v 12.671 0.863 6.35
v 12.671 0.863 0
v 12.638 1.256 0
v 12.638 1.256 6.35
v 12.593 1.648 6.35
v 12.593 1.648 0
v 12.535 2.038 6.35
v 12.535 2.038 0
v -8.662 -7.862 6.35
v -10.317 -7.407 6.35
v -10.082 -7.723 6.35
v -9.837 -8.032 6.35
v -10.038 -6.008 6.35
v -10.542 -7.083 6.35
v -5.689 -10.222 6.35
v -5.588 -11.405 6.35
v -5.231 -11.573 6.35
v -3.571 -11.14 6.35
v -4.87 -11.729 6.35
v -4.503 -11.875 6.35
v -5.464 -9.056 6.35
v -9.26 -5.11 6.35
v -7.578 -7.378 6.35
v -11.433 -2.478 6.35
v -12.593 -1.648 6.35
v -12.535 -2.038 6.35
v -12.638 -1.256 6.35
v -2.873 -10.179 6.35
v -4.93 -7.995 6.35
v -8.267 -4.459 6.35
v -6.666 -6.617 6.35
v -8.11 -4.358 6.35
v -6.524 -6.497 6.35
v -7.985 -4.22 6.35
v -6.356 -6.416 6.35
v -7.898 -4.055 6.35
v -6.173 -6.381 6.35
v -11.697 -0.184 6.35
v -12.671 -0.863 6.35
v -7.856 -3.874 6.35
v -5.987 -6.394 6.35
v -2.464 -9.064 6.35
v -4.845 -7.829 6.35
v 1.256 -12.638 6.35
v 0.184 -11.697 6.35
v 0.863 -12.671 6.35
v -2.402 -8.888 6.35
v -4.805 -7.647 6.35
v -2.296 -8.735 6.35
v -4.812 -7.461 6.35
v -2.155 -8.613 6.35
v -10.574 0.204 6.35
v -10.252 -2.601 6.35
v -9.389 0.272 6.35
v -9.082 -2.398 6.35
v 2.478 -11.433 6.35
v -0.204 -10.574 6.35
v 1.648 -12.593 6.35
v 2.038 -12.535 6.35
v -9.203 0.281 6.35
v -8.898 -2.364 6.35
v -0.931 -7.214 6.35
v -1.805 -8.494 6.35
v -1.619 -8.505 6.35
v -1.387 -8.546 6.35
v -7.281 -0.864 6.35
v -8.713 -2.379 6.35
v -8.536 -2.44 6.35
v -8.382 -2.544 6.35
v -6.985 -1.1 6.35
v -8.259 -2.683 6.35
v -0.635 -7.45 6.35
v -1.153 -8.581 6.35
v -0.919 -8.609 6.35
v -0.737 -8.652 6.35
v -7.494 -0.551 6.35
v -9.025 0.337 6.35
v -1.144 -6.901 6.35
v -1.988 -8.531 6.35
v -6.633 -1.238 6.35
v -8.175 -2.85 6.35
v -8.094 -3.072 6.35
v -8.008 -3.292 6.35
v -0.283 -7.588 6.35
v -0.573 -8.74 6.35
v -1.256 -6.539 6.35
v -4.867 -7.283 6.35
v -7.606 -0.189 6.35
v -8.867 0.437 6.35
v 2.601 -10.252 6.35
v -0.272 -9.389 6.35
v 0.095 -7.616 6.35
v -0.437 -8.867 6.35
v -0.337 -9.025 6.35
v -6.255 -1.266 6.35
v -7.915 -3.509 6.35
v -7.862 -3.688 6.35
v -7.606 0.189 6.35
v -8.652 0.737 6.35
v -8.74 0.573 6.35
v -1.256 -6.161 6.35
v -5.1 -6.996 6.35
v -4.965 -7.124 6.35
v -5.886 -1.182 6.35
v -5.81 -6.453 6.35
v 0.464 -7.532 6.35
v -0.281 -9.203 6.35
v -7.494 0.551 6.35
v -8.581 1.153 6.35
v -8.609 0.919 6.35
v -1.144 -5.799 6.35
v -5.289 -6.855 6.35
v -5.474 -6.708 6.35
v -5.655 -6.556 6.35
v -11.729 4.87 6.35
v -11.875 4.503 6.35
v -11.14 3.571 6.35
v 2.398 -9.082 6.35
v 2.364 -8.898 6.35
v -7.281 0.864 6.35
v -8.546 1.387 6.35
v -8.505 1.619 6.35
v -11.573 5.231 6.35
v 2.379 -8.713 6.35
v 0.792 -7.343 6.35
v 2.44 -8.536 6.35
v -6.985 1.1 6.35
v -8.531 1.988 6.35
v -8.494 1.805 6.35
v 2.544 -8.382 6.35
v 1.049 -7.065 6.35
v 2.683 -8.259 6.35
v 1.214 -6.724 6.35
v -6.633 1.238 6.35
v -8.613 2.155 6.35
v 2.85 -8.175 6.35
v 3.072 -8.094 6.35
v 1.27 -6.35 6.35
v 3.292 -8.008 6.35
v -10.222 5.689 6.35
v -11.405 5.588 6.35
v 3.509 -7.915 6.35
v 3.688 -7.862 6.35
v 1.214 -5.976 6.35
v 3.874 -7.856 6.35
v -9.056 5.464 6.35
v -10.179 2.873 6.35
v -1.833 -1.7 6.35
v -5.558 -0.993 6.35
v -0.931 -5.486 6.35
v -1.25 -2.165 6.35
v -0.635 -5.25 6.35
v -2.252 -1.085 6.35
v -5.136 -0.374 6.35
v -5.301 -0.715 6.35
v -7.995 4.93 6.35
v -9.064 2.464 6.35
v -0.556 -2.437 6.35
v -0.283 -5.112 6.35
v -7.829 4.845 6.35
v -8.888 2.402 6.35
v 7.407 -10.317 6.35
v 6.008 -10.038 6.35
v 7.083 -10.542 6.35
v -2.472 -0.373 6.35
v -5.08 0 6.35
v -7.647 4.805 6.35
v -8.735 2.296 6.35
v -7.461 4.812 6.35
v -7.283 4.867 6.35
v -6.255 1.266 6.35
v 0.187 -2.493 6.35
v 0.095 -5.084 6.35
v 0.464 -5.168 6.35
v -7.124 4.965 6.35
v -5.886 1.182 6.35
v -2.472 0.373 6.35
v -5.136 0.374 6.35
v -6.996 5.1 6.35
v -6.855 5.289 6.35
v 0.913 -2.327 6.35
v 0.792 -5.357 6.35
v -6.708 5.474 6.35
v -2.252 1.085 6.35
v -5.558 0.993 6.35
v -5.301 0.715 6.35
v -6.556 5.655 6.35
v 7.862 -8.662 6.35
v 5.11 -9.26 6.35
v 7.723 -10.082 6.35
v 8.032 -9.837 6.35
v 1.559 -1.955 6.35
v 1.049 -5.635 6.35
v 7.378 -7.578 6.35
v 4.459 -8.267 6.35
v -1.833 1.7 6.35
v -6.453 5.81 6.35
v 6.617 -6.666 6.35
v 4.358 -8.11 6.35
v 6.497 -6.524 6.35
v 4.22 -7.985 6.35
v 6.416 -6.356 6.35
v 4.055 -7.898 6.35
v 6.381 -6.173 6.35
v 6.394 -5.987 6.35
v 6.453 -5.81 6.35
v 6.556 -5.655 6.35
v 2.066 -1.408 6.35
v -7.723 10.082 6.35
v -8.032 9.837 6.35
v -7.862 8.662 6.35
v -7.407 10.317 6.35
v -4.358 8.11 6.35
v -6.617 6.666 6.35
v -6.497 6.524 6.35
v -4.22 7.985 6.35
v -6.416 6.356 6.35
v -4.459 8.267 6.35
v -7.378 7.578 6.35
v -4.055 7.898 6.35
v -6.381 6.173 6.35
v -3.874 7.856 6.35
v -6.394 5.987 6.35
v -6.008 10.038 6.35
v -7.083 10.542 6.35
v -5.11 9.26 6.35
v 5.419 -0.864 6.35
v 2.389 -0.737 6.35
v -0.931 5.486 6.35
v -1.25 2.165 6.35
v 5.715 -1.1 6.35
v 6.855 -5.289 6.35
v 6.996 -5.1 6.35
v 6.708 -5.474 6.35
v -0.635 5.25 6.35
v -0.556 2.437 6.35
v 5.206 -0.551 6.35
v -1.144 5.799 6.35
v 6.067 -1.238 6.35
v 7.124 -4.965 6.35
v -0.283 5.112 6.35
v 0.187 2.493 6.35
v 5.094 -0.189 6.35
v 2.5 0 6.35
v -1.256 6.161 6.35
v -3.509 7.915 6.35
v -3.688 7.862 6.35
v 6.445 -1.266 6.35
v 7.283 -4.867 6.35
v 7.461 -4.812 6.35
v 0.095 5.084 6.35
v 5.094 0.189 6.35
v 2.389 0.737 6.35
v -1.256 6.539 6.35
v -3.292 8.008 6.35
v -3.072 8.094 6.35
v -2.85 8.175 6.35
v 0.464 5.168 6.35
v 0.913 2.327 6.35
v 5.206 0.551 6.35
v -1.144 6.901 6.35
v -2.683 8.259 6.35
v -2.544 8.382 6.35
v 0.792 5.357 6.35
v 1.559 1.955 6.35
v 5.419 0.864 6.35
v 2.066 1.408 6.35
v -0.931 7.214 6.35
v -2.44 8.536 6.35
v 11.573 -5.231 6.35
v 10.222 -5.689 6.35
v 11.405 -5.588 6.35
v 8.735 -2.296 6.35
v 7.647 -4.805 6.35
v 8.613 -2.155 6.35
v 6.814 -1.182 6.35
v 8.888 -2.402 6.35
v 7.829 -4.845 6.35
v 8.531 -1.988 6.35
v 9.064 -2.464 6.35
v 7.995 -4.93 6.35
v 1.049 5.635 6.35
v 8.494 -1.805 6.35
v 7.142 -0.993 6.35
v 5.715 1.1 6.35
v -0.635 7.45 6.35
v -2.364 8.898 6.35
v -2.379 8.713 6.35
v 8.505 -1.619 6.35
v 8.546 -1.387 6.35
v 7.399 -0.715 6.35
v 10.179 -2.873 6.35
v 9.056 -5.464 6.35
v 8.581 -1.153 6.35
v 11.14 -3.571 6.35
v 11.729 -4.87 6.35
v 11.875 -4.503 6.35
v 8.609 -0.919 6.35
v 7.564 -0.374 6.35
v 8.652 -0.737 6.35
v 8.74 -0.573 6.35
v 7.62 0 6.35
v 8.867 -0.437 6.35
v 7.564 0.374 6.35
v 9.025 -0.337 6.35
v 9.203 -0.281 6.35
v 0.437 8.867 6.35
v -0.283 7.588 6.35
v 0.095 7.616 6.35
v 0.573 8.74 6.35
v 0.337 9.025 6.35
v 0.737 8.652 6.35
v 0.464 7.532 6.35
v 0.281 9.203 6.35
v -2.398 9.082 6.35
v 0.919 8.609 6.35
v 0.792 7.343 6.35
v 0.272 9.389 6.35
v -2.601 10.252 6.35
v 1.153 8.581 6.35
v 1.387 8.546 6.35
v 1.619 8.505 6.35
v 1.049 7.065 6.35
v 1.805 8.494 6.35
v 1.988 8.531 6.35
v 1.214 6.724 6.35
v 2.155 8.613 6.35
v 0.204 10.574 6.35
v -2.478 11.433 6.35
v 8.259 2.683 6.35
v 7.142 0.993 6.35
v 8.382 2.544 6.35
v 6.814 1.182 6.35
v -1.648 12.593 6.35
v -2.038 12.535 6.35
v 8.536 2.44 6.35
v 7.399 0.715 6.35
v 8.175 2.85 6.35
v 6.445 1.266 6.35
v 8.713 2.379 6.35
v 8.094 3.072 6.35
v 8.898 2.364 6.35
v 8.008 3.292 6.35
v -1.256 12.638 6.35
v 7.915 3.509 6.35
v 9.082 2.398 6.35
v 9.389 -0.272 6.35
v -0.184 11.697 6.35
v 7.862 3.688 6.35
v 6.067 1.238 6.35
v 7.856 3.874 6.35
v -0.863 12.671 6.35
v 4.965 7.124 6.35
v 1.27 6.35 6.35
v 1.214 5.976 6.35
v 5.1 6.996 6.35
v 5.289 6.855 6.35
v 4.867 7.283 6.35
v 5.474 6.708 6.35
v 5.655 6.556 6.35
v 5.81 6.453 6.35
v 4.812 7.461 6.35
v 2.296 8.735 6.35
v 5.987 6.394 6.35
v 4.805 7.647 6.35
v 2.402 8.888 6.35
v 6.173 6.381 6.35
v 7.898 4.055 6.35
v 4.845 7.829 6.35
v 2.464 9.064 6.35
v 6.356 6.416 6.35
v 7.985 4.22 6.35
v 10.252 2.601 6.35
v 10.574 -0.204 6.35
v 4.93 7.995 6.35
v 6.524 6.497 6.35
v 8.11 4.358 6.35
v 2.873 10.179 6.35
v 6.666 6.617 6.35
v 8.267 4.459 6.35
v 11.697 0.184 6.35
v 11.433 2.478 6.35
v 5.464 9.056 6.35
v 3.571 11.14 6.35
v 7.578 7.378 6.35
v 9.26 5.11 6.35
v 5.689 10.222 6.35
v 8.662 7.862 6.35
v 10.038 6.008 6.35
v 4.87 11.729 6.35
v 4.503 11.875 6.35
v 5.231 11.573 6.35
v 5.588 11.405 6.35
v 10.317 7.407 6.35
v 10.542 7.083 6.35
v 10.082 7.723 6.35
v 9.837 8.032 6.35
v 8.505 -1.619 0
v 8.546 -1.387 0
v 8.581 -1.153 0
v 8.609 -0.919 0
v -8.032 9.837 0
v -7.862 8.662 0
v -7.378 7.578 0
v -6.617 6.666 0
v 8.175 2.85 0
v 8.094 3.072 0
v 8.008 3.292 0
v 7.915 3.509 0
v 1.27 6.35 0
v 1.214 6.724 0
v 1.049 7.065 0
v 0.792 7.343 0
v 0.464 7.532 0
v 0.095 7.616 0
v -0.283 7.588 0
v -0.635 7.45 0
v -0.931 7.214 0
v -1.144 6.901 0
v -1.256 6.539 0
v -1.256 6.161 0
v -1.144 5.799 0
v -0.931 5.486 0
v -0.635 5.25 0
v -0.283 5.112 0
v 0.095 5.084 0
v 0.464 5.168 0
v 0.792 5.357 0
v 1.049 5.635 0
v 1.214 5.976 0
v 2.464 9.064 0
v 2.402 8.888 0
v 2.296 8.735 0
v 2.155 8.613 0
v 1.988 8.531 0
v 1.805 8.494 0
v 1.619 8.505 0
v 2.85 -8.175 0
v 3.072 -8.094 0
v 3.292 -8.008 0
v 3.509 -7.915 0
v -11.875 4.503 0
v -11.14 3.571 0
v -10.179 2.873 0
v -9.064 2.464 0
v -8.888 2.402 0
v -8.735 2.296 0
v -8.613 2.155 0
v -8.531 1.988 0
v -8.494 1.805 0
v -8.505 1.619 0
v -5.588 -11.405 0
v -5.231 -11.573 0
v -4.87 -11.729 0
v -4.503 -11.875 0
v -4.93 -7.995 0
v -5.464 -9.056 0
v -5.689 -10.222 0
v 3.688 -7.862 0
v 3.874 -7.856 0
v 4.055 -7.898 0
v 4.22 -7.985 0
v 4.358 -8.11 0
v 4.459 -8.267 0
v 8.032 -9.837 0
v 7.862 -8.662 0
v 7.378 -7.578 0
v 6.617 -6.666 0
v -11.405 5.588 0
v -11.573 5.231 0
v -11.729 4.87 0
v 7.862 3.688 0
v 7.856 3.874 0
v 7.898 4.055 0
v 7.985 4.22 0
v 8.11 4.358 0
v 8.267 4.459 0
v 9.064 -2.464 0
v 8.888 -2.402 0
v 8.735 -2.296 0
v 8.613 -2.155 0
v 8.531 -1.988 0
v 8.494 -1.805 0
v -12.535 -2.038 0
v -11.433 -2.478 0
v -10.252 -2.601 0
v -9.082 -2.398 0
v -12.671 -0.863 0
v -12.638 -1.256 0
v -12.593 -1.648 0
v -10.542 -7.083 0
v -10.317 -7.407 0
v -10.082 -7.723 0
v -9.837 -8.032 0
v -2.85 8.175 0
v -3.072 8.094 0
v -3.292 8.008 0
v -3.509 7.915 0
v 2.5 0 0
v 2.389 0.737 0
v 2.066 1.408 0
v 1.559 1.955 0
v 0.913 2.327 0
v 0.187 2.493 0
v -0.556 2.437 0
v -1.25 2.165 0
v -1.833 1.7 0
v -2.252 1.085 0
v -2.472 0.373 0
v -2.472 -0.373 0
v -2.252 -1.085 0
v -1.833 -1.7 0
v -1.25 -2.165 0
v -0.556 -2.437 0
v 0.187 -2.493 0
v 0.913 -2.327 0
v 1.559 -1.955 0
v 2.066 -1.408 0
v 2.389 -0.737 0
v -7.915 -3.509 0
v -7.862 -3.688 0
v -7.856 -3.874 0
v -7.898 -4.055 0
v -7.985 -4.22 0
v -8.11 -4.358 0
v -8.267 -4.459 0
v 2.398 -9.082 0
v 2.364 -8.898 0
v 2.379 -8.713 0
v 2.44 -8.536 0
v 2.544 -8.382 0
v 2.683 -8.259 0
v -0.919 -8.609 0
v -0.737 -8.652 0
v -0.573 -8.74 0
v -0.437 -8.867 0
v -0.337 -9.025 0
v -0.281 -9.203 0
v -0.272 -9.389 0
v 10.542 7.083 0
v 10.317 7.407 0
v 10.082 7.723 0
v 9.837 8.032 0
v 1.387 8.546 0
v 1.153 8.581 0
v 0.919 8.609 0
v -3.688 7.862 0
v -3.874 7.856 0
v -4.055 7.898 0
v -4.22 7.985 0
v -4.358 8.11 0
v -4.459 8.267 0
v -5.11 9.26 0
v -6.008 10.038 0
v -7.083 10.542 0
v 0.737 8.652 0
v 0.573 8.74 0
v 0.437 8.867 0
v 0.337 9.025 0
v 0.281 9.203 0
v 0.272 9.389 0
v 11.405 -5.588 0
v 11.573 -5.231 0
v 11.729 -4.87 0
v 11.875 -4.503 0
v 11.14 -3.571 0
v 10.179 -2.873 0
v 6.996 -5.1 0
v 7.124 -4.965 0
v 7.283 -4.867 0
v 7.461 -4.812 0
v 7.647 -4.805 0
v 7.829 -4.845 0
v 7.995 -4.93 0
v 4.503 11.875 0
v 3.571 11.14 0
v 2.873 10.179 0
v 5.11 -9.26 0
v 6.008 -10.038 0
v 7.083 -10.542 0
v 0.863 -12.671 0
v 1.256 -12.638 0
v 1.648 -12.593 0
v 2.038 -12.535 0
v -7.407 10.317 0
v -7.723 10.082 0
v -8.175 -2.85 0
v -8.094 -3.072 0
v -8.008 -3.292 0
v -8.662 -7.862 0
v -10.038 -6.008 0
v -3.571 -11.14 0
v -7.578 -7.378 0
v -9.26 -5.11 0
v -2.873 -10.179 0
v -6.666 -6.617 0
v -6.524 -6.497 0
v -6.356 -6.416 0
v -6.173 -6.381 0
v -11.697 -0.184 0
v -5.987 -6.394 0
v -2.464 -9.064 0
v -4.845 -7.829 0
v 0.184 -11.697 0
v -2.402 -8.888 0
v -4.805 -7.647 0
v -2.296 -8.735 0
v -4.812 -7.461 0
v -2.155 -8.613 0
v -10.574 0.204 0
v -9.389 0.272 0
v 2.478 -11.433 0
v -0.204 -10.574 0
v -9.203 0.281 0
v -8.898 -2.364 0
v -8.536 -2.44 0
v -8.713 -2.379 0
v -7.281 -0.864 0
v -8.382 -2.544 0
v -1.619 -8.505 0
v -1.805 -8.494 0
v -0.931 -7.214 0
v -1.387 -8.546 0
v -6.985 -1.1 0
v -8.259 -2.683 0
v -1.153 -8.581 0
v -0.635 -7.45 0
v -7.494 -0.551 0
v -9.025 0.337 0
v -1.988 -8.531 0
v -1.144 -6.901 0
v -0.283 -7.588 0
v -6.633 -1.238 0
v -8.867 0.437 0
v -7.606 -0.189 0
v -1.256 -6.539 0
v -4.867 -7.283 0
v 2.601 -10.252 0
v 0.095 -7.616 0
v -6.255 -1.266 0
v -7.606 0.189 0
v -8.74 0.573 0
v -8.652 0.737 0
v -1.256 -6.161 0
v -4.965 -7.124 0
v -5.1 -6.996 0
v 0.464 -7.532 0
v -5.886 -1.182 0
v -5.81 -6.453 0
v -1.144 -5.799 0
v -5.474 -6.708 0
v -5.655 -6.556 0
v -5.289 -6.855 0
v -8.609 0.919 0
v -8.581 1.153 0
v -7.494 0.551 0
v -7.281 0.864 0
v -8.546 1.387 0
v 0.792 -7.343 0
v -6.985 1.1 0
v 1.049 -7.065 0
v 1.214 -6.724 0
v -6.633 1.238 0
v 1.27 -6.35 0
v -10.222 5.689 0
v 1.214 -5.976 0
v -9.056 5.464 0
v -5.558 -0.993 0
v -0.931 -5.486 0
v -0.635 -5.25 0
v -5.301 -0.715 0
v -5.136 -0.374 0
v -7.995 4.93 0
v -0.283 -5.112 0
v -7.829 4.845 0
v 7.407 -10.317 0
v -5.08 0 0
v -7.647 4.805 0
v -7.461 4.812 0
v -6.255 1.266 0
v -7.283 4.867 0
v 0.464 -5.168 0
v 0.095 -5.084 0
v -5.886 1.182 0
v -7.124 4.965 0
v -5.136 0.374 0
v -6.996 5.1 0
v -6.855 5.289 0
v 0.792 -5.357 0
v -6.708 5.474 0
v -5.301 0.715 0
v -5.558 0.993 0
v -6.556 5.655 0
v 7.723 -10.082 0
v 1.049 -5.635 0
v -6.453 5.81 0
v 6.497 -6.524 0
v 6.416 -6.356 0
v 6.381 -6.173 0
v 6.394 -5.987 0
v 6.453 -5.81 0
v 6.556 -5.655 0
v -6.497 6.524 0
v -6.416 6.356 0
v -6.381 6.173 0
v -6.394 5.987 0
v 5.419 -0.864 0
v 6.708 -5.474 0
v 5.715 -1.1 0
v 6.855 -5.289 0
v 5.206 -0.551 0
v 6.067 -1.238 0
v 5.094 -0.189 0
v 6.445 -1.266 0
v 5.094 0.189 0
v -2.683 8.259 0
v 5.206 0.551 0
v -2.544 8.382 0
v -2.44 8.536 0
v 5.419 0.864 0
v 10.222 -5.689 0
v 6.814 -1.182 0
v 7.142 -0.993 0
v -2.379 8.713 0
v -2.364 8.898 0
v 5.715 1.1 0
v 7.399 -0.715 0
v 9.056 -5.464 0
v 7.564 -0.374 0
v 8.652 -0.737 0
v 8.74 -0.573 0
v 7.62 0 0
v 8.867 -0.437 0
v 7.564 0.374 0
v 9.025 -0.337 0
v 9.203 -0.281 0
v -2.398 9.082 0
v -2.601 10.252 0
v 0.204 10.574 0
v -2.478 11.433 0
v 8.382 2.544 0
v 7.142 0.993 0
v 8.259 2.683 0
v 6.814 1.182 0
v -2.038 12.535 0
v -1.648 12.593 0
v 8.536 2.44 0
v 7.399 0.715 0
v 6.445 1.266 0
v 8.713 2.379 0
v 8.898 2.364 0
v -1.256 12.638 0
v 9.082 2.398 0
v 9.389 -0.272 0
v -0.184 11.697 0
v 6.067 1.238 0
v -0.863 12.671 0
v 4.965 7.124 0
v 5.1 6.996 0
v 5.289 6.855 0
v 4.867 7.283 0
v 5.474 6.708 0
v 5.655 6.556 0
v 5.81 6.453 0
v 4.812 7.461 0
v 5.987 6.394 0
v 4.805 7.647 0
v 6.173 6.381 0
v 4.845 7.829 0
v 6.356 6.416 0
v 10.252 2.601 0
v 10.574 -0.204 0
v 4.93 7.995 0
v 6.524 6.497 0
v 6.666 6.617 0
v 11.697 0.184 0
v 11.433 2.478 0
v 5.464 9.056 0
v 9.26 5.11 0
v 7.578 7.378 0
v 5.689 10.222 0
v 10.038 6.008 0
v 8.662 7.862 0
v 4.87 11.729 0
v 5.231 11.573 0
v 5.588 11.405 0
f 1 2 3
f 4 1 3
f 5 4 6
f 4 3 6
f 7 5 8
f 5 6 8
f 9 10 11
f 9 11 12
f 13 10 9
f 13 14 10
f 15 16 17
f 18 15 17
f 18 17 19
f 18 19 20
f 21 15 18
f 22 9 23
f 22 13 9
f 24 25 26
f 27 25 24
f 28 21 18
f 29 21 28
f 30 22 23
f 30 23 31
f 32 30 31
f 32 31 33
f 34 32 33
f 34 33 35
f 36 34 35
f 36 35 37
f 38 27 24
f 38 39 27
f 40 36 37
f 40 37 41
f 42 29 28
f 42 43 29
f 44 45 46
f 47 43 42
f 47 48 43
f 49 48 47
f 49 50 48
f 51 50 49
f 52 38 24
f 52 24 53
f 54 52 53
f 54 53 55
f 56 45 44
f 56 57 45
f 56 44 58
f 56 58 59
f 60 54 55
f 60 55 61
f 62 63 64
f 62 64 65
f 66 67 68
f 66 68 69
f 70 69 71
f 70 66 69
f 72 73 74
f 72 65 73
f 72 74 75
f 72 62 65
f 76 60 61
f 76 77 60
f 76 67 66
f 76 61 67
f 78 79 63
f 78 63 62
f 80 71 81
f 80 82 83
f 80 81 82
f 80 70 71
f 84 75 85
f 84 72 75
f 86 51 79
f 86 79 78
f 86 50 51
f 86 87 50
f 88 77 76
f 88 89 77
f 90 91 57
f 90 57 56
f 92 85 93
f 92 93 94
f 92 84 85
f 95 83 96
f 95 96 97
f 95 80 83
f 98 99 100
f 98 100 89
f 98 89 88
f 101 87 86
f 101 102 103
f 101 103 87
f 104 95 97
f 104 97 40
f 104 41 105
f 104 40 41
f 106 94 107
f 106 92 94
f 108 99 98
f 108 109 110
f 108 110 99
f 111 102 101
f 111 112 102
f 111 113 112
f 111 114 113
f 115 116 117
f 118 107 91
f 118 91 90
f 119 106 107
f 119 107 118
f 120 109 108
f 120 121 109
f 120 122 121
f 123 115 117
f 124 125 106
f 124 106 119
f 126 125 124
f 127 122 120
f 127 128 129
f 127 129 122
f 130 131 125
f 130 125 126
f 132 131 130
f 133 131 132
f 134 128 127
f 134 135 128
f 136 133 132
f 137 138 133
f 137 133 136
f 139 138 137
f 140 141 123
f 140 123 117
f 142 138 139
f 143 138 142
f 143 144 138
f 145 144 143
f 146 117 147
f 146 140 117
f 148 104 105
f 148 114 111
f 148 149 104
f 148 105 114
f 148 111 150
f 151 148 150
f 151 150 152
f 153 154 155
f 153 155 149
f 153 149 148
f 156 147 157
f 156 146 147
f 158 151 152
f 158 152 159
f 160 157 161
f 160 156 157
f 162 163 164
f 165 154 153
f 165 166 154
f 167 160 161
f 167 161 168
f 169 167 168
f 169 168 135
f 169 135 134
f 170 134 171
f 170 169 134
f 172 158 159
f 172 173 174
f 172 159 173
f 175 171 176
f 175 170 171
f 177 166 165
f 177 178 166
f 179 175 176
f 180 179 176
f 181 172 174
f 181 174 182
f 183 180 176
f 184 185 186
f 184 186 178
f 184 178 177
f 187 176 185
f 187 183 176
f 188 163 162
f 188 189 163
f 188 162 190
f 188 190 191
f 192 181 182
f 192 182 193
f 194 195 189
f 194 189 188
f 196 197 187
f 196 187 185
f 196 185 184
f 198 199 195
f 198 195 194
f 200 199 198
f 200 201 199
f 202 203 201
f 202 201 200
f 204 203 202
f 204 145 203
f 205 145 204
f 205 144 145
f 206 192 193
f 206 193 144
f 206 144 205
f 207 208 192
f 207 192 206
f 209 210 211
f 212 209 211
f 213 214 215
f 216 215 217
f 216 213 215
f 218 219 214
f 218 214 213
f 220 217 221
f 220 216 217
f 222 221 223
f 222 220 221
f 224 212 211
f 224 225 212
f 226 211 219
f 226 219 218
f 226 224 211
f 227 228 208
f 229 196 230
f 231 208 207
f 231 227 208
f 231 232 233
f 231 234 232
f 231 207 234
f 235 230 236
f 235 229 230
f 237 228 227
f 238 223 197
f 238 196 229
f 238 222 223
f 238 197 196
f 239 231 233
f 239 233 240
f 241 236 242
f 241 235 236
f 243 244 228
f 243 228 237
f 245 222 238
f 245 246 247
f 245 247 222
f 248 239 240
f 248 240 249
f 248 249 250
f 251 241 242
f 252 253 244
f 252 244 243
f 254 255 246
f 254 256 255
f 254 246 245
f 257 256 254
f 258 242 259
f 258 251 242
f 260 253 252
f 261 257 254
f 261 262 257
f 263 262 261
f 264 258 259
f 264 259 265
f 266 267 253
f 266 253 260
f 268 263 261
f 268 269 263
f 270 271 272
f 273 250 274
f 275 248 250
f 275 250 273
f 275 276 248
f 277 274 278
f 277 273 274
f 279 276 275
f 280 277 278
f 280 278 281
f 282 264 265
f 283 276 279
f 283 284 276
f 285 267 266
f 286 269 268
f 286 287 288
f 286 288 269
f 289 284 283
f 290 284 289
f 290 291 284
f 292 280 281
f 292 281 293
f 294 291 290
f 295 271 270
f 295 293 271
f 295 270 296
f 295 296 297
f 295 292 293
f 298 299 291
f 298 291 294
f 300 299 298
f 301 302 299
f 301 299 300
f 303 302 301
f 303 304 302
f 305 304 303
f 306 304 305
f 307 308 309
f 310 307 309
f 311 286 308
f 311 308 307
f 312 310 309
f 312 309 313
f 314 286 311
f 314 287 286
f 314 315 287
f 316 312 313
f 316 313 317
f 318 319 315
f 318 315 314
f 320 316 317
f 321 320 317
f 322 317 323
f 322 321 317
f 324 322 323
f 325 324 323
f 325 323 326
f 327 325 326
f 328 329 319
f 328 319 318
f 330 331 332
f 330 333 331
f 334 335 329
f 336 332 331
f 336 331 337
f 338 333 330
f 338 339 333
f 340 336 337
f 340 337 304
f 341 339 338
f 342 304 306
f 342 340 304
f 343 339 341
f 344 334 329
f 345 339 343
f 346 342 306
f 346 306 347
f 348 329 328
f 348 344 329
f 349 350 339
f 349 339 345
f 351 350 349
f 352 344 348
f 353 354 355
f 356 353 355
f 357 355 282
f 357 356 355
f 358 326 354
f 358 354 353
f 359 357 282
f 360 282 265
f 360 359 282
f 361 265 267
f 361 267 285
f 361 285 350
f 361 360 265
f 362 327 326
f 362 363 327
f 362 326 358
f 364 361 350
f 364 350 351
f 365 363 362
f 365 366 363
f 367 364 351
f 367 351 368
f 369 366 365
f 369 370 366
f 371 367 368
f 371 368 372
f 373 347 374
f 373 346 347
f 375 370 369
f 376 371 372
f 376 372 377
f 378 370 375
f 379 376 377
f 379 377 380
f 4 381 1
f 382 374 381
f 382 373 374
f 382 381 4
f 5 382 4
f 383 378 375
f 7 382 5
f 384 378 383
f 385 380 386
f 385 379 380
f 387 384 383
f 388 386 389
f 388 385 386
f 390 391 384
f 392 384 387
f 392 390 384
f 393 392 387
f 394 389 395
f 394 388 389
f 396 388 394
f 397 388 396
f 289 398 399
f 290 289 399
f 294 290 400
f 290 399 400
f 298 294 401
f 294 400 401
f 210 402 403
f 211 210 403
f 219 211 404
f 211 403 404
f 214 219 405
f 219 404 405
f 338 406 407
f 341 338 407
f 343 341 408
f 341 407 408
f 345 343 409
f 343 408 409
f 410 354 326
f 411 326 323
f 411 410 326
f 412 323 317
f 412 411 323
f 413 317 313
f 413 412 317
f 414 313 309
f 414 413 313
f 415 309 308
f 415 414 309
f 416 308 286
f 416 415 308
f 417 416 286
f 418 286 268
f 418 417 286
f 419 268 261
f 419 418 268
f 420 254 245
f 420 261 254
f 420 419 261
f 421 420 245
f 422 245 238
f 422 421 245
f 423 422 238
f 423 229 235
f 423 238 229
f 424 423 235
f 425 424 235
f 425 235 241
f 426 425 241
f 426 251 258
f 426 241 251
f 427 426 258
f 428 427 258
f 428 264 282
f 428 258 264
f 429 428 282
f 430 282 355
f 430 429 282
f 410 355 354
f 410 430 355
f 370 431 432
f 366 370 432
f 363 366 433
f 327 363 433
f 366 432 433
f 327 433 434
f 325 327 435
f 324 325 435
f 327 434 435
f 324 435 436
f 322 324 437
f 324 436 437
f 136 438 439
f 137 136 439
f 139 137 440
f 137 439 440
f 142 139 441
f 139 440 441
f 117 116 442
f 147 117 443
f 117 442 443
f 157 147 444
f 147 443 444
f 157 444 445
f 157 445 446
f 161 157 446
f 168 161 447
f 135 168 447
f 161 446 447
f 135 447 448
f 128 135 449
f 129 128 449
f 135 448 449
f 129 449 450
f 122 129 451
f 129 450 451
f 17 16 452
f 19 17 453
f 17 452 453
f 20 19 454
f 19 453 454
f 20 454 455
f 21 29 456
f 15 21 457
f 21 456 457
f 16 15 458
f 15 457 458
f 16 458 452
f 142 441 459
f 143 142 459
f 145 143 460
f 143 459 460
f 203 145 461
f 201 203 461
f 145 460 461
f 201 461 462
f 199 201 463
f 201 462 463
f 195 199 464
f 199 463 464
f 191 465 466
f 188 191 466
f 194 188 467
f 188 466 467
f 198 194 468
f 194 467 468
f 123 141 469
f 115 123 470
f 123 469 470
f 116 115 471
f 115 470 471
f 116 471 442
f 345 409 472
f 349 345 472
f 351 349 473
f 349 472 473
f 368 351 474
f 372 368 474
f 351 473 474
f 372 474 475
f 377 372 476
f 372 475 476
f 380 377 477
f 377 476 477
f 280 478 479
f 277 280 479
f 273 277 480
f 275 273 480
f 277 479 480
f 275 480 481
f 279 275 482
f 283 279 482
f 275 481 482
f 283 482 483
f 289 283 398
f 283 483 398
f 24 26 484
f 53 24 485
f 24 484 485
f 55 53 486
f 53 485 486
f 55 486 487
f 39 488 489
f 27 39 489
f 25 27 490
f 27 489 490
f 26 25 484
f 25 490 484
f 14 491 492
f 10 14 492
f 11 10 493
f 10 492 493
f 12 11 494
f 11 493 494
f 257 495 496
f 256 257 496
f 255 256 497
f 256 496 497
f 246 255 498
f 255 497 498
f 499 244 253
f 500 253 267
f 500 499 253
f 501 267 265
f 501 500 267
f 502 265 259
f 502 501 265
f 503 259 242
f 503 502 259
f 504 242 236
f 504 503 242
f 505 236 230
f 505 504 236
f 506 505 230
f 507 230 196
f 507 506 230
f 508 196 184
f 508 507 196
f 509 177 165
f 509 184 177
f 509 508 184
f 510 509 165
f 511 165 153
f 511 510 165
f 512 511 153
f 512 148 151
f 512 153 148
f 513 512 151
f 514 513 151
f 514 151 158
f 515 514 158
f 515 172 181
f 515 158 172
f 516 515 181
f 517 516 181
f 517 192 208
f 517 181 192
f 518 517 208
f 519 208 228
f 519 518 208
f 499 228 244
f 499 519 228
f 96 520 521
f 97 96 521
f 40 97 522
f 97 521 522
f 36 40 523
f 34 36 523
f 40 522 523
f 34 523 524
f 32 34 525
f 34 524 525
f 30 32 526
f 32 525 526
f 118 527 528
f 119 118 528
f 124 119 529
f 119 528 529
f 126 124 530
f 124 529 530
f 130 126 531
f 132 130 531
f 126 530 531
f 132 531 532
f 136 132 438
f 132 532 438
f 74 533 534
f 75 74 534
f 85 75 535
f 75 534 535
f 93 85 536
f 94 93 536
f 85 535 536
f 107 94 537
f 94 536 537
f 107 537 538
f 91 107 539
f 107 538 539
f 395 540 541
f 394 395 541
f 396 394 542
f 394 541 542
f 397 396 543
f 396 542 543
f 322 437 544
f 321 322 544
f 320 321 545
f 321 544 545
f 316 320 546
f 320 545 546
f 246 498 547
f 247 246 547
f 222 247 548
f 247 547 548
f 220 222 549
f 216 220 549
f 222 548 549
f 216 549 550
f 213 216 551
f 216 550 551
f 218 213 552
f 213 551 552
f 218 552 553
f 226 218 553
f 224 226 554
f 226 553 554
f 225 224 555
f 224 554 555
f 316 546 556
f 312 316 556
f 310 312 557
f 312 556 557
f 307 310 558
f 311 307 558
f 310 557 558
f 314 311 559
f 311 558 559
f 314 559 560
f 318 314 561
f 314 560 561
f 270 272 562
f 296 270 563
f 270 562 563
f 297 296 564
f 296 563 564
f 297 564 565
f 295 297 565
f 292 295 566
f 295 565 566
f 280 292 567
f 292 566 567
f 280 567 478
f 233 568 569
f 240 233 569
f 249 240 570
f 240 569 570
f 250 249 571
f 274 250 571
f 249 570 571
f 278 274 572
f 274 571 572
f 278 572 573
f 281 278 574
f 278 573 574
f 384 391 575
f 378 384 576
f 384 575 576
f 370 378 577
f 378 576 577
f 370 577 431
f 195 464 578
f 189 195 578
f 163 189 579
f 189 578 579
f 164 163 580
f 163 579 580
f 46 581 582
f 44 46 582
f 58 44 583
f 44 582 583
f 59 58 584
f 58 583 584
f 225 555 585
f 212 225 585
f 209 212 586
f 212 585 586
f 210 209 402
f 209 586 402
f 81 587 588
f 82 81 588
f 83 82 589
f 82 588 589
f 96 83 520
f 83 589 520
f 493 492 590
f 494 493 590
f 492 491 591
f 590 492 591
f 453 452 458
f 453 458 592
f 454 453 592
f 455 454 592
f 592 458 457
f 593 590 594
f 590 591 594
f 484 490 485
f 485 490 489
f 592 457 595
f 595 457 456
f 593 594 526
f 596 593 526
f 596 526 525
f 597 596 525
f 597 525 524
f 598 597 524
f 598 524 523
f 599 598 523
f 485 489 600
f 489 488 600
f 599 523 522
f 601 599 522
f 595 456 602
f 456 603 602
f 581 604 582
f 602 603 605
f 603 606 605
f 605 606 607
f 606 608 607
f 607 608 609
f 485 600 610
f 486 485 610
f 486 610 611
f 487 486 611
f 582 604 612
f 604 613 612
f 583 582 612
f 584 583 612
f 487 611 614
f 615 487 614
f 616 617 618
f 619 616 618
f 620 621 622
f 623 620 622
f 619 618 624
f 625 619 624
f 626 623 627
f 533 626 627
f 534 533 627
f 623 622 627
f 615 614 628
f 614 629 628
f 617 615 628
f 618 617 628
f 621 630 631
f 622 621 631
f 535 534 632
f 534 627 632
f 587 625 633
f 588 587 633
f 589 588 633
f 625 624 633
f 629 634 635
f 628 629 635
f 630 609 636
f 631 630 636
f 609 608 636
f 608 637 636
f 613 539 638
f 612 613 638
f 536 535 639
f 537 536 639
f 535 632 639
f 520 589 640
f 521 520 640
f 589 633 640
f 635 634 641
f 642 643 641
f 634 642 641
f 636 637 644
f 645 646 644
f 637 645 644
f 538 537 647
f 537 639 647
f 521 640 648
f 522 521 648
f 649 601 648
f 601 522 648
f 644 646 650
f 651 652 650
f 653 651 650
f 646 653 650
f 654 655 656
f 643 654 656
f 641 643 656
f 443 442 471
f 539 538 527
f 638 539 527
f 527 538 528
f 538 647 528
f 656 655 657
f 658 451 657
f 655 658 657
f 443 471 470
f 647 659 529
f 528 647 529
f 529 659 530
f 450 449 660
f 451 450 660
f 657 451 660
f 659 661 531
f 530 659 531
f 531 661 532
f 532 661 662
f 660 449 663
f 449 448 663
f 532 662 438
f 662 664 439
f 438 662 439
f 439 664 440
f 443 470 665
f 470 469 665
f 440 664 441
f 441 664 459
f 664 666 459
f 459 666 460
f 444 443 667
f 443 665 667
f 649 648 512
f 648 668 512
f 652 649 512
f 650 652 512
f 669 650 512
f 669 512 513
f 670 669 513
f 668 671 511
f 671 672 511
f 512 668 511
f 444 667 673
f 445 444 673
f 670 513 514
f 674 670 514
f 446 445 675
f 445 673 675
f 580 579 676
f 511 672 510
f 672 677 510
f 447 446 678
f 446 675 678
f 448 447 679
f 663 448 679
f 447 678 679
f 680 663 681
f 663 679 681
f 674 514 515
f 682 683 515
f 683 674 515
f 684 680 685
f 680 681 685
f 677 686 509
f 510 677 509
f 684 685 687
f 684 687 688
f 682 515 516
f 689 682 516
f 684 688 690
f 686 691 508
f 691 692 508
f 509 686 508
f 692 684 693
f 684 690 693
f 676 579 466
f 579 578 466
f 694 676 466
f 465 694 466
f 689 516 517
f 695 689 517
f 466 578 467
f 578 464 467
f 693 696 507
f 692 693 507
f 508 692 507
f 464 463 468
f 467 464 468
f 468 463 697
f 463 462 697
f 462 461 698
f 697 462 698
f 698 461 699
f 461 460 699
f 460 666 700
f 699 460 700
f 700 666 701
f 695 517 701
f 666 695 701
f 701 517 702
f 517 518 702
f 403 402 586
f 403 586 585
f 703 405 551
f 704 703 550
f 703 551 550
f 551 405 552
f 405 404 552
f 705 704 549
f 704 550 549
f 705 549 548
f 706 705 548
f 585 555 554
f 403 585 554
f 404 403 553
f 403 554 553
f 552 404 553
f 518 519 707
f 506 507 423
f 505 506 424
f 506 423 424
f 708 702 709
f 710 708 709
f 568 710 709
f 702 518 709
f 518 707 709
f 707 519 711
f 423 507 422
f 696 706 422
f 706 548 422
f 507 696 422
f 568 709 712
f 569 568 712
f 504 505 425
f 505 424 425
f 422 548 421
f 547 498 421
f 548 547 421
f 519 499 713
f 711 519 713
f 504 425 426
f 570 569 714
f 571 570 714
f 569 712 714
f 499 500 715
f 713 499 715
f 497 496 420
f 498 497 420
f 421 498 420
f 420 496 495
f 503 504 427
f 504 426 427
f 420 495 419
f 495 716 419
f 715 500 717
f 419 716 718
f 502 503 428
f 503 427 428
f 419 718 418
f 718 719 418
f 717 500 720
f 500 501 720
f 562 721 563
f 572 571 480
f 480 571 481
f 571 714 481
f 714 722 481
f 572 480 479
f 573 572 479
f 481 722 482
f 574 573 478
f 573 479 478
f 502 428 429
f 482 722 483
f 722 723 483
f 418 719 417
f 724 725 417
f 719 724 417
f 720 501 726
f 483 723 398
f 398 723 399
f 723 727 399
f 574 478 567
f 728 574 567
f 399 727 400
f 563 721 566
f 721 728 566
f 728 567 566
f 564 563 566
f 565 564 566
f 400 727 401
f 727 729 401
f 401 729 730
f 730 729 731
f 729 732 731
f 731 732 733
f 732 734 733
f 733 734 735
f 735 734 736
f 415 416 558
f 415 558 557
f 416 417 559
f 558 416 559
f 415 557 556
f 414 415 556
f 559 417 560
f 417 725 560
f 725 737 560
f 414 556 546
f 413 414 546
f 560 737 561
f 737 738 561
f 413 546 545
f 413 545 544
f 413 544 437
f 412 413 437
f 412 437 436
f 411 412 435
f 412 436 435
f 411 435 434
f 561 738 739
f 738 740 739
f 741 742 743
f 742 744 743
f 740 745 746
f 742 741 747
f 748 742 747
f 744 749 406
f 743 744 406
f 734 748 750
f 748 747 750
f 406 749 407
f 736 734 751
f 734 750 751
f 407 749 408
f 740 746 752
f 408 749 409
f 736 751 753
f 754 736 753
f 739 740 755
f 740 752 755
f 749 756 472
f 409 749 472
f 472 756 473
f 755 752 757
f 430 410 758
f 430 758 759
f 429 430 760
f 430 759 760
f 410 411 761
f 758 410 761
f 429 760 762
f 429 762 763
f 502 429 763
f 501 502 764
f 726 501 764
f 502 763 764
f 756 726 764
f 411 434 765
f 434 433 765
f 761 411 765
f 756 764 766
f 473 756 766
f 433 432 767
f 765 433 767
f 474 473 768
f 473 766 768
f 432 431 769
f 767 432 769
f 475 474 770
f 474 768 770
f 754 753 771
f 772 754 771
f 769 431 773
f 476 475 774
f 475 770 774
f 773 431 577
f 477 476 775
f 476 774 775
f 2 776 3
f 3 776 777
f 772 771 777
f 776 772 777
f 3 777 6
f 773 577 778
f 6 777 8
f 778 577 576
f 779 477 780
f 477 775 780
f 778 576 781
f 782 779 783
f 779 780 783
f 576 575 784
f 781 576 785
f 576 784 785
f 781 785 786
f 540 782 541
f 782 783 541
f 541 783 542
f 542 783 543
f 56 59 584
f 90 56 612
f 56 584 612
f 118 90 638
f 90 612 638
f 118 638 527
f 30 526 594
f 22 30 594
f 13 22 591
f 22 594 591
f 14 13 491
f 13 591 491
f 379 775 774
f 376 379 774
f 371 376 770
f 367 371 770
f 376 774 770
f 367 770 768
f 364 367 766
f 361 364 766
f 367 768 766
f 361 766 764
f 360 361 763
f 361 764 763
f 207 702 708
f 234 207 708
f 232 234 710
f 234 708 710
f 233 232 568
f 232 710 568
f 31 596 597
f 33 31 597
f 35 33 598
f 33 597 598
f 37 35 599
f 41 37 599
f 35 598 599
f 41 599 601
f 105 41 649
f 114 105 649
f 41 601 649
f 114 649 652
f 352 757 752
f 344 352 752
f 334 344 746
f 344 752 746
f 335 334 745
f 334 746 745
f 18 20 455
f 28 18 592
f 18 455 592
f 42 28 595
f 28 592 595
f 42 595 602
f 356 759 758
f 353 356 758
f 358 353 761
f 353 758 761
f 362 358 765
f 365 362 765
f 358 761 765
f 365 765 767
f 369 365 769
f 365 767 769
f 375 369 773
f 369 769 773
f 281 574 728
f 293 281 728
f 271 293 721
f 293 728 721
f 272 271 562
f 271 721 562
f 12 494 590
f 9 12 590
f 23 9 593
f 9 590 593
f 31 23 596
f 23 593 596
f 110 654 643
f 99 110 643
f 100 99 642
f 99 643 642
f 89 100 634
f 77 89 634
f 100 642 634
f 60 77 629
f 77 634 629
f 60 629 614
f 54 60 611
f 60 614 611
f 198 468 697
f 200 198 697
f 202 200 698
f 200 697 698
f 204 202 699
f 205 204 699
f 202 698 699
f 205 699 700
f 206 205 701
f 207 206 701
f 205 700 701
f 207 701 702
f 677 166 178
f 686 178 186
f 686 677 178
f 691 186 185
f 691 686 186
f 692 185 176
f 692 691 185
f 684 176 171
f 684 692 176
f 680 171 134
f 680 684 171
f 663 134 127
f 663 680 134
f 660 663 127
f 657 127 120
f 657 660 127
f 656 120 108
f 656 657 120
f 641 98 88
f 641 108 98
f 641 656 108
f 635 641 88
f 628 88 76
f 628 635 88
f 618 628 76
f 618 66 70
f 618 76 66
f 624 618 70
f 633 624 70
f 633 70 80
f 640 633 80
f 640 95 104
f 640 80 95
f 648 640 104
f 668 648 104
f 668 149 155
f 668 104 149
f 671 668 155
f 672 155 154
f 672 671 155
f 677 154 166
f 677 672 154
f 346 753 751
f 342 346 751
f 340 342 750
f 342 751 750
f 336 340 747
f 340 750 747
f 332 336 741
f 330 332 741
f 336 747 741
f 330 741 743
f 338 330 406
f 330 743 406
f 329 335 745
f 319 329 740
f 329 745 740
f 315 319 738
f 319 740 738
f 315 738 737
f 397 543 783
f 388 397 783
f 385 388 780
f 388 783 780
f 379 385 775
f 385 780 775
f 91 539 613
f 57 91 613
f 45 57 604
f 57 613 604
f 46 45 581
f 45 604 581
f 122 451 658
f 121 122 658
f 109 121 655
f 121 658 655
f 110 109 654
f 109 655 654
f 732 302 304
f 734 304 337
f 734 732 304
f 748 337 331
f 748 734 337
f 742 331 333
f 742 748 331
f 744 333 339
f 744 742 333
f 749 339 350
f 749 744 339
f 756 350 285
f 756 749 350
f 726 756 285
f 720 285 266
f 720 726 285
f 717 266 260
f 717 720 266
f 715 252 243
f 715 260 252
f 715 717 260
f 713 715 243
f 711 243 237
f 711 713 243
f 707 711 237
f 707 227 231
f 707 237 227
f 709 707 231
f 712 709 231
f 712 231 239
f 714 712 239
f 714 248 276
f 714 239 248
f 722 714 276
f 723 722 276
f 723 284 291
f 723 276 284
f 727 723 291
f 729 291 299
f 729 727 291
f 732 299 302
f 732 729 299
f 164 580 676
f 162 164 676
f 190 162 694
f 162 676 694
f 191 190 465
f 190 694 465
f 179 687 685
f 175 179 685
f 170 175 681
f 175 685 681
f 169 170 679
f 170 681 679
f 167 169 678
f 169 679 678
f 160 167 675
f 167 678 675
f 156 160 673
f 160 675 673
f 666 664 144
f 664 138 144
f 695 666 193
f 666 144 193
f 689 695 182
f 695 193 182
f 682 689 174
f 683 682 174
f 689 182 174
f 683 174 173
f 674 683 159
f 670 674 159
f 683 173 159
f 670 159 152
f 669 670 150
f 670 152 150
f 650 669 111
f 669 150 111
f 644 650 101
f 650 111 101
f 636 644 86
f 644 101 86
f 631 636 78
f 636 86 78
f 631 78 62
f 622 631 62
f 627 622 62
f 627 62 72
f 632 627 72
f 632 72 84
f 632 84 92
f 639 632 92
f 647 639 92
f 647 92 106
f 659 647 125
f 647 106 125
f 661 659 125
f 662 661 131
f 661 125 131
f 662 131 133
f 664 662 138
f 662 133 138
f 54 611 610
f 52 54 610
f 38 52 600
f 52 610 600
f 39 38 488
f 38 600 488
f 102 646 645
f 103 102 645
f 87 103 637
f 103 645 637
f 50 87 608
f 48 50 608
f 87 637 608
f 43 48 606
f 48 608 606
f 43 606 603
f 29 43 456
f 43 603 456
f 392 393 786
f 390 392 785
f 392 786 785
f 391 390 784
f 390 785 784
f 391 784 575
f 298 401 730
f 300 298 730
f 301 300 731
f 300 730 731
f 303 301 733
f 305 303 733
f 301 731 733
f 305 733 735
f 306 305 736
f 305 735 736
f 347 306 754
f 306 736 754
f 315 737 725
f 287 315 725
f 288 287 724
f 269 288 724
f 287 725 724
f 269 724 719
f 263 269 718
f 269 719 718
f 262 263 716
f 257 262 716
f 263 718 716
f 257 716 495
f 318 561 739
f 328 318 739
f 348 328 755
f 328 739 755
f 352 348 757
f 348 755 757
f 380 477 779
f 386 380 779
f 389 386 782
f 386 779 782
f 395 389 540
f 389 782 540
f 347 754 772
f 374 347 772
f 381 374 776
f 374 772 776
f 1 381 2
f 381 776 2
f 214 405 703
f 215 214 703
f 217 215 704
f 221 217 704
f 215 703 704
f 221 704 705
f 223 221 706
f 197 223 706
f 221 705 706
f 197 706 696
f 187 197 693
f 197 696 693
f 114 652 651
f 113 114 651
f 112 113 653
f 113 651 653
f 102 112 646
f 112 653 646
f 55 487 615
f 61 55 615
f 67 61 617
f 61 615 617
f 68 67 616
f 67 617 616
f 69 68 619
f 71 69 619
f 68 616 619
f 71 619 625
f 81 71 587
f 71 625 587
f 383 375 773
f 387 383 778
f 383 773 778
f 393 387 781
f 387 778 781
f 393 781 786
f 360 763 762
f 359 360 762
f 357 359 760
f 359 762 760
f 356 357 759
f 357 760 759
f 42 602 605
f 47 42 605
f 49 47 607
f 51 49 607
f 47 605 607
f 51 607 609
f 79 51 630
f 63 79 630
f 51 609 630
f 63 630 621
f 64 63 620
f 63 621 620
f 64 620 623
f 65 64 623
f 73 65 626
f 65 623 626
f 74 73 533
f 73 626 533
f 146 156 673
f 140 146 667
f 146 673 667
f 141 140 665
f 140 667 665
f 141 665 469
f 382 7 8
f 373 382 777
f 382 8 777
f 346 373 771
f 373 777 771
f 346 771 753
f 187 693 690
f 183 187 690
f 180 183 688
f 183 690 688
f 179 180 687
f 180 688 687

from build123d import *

# Parameters (mm, degrees)
SKETCH3_R         = 12.7
GEARBODY_DEPTH    = 6.35
TOOTHCUT_DEPTH    = 20.05
CIRPATTERN1_COUNT = 12
BOREDIA_R         = 2.5
BOREDIA_R_2       = 1.27
BORE_DEPTH        = 12700


with BuildPart() as part:
    # Sketch3 → gearBody (new body)
    with BuildSketch(Plane.XY):
        Circle(SKETCH3_R)
    extrude(amount=GEARBODY_DEPTH)

    # Sketch2 → toothCut (cut, through all)
    with BuildSketch(Plane.XY):
        with BuildLine():
            ThreePointArc((8.504981128, -1.619352377), (8.564111751, -1.270037802), (8.608901587, -0.918596522))
            ThreePointArc((8.608901587, -0.918596522), (8.867488023, -0.436790342), (9.388953743, -0.272237485))
            ThreePointArc((9.388953743, -0.272237485), (11.599176183, 0.135890641), (13.30511426, 1.599252209))
            ThreePointArc((13.30511426, 1.599252209), (13.255912686, -1.96582094), (12.268366453, -5.391739765))
            ThreePointArc((12.268366453, -5.391739765), (11.060534793, -3.49627294), (9.063879737, -2.464274691))
            ThreePointArc((9.063879737, -2.464274691), (8.61261217, -2.155467755), (8.504981128, -1.619352377))
        make_face()
    toothcut = extrude(amount=TOOTHCUT_DEPTH, mode=Mode.SUBTRACT)

    # CirPattern1: toothCut ×12 about axis
    cirpattern1_axis = Axis((0, 0, 6.35), (0, 0, -1))
    for i in range(1, CIRPATTERN1_COUNT):
        add(toothcut.rotate(cirpattern1_axis, i * 360 / CIRPATTERN1_COUNT), mode=Mode.SUBTRACT)

    # boreDia → bore (cut, symmetric)
    with BuildSketch(Plane.XY):
        Circle(BOREDIA_R)
        with Locations((0, 6.35)):
            Circle(BOREDIA_R_2)
        with Locations((6.35, 0)):
            Circle(BOREDIA_R_2)
        with Locations((-6.35, 0)):
            Circle(BOREDIA_R_2)
        with Locations((0, -6.35)):
            Circle(BOREDIA_R_2)
    extrude(amount=BORE_DEPTH, both=True, mode=Mode.SUBTRACT)


solid = part.part
